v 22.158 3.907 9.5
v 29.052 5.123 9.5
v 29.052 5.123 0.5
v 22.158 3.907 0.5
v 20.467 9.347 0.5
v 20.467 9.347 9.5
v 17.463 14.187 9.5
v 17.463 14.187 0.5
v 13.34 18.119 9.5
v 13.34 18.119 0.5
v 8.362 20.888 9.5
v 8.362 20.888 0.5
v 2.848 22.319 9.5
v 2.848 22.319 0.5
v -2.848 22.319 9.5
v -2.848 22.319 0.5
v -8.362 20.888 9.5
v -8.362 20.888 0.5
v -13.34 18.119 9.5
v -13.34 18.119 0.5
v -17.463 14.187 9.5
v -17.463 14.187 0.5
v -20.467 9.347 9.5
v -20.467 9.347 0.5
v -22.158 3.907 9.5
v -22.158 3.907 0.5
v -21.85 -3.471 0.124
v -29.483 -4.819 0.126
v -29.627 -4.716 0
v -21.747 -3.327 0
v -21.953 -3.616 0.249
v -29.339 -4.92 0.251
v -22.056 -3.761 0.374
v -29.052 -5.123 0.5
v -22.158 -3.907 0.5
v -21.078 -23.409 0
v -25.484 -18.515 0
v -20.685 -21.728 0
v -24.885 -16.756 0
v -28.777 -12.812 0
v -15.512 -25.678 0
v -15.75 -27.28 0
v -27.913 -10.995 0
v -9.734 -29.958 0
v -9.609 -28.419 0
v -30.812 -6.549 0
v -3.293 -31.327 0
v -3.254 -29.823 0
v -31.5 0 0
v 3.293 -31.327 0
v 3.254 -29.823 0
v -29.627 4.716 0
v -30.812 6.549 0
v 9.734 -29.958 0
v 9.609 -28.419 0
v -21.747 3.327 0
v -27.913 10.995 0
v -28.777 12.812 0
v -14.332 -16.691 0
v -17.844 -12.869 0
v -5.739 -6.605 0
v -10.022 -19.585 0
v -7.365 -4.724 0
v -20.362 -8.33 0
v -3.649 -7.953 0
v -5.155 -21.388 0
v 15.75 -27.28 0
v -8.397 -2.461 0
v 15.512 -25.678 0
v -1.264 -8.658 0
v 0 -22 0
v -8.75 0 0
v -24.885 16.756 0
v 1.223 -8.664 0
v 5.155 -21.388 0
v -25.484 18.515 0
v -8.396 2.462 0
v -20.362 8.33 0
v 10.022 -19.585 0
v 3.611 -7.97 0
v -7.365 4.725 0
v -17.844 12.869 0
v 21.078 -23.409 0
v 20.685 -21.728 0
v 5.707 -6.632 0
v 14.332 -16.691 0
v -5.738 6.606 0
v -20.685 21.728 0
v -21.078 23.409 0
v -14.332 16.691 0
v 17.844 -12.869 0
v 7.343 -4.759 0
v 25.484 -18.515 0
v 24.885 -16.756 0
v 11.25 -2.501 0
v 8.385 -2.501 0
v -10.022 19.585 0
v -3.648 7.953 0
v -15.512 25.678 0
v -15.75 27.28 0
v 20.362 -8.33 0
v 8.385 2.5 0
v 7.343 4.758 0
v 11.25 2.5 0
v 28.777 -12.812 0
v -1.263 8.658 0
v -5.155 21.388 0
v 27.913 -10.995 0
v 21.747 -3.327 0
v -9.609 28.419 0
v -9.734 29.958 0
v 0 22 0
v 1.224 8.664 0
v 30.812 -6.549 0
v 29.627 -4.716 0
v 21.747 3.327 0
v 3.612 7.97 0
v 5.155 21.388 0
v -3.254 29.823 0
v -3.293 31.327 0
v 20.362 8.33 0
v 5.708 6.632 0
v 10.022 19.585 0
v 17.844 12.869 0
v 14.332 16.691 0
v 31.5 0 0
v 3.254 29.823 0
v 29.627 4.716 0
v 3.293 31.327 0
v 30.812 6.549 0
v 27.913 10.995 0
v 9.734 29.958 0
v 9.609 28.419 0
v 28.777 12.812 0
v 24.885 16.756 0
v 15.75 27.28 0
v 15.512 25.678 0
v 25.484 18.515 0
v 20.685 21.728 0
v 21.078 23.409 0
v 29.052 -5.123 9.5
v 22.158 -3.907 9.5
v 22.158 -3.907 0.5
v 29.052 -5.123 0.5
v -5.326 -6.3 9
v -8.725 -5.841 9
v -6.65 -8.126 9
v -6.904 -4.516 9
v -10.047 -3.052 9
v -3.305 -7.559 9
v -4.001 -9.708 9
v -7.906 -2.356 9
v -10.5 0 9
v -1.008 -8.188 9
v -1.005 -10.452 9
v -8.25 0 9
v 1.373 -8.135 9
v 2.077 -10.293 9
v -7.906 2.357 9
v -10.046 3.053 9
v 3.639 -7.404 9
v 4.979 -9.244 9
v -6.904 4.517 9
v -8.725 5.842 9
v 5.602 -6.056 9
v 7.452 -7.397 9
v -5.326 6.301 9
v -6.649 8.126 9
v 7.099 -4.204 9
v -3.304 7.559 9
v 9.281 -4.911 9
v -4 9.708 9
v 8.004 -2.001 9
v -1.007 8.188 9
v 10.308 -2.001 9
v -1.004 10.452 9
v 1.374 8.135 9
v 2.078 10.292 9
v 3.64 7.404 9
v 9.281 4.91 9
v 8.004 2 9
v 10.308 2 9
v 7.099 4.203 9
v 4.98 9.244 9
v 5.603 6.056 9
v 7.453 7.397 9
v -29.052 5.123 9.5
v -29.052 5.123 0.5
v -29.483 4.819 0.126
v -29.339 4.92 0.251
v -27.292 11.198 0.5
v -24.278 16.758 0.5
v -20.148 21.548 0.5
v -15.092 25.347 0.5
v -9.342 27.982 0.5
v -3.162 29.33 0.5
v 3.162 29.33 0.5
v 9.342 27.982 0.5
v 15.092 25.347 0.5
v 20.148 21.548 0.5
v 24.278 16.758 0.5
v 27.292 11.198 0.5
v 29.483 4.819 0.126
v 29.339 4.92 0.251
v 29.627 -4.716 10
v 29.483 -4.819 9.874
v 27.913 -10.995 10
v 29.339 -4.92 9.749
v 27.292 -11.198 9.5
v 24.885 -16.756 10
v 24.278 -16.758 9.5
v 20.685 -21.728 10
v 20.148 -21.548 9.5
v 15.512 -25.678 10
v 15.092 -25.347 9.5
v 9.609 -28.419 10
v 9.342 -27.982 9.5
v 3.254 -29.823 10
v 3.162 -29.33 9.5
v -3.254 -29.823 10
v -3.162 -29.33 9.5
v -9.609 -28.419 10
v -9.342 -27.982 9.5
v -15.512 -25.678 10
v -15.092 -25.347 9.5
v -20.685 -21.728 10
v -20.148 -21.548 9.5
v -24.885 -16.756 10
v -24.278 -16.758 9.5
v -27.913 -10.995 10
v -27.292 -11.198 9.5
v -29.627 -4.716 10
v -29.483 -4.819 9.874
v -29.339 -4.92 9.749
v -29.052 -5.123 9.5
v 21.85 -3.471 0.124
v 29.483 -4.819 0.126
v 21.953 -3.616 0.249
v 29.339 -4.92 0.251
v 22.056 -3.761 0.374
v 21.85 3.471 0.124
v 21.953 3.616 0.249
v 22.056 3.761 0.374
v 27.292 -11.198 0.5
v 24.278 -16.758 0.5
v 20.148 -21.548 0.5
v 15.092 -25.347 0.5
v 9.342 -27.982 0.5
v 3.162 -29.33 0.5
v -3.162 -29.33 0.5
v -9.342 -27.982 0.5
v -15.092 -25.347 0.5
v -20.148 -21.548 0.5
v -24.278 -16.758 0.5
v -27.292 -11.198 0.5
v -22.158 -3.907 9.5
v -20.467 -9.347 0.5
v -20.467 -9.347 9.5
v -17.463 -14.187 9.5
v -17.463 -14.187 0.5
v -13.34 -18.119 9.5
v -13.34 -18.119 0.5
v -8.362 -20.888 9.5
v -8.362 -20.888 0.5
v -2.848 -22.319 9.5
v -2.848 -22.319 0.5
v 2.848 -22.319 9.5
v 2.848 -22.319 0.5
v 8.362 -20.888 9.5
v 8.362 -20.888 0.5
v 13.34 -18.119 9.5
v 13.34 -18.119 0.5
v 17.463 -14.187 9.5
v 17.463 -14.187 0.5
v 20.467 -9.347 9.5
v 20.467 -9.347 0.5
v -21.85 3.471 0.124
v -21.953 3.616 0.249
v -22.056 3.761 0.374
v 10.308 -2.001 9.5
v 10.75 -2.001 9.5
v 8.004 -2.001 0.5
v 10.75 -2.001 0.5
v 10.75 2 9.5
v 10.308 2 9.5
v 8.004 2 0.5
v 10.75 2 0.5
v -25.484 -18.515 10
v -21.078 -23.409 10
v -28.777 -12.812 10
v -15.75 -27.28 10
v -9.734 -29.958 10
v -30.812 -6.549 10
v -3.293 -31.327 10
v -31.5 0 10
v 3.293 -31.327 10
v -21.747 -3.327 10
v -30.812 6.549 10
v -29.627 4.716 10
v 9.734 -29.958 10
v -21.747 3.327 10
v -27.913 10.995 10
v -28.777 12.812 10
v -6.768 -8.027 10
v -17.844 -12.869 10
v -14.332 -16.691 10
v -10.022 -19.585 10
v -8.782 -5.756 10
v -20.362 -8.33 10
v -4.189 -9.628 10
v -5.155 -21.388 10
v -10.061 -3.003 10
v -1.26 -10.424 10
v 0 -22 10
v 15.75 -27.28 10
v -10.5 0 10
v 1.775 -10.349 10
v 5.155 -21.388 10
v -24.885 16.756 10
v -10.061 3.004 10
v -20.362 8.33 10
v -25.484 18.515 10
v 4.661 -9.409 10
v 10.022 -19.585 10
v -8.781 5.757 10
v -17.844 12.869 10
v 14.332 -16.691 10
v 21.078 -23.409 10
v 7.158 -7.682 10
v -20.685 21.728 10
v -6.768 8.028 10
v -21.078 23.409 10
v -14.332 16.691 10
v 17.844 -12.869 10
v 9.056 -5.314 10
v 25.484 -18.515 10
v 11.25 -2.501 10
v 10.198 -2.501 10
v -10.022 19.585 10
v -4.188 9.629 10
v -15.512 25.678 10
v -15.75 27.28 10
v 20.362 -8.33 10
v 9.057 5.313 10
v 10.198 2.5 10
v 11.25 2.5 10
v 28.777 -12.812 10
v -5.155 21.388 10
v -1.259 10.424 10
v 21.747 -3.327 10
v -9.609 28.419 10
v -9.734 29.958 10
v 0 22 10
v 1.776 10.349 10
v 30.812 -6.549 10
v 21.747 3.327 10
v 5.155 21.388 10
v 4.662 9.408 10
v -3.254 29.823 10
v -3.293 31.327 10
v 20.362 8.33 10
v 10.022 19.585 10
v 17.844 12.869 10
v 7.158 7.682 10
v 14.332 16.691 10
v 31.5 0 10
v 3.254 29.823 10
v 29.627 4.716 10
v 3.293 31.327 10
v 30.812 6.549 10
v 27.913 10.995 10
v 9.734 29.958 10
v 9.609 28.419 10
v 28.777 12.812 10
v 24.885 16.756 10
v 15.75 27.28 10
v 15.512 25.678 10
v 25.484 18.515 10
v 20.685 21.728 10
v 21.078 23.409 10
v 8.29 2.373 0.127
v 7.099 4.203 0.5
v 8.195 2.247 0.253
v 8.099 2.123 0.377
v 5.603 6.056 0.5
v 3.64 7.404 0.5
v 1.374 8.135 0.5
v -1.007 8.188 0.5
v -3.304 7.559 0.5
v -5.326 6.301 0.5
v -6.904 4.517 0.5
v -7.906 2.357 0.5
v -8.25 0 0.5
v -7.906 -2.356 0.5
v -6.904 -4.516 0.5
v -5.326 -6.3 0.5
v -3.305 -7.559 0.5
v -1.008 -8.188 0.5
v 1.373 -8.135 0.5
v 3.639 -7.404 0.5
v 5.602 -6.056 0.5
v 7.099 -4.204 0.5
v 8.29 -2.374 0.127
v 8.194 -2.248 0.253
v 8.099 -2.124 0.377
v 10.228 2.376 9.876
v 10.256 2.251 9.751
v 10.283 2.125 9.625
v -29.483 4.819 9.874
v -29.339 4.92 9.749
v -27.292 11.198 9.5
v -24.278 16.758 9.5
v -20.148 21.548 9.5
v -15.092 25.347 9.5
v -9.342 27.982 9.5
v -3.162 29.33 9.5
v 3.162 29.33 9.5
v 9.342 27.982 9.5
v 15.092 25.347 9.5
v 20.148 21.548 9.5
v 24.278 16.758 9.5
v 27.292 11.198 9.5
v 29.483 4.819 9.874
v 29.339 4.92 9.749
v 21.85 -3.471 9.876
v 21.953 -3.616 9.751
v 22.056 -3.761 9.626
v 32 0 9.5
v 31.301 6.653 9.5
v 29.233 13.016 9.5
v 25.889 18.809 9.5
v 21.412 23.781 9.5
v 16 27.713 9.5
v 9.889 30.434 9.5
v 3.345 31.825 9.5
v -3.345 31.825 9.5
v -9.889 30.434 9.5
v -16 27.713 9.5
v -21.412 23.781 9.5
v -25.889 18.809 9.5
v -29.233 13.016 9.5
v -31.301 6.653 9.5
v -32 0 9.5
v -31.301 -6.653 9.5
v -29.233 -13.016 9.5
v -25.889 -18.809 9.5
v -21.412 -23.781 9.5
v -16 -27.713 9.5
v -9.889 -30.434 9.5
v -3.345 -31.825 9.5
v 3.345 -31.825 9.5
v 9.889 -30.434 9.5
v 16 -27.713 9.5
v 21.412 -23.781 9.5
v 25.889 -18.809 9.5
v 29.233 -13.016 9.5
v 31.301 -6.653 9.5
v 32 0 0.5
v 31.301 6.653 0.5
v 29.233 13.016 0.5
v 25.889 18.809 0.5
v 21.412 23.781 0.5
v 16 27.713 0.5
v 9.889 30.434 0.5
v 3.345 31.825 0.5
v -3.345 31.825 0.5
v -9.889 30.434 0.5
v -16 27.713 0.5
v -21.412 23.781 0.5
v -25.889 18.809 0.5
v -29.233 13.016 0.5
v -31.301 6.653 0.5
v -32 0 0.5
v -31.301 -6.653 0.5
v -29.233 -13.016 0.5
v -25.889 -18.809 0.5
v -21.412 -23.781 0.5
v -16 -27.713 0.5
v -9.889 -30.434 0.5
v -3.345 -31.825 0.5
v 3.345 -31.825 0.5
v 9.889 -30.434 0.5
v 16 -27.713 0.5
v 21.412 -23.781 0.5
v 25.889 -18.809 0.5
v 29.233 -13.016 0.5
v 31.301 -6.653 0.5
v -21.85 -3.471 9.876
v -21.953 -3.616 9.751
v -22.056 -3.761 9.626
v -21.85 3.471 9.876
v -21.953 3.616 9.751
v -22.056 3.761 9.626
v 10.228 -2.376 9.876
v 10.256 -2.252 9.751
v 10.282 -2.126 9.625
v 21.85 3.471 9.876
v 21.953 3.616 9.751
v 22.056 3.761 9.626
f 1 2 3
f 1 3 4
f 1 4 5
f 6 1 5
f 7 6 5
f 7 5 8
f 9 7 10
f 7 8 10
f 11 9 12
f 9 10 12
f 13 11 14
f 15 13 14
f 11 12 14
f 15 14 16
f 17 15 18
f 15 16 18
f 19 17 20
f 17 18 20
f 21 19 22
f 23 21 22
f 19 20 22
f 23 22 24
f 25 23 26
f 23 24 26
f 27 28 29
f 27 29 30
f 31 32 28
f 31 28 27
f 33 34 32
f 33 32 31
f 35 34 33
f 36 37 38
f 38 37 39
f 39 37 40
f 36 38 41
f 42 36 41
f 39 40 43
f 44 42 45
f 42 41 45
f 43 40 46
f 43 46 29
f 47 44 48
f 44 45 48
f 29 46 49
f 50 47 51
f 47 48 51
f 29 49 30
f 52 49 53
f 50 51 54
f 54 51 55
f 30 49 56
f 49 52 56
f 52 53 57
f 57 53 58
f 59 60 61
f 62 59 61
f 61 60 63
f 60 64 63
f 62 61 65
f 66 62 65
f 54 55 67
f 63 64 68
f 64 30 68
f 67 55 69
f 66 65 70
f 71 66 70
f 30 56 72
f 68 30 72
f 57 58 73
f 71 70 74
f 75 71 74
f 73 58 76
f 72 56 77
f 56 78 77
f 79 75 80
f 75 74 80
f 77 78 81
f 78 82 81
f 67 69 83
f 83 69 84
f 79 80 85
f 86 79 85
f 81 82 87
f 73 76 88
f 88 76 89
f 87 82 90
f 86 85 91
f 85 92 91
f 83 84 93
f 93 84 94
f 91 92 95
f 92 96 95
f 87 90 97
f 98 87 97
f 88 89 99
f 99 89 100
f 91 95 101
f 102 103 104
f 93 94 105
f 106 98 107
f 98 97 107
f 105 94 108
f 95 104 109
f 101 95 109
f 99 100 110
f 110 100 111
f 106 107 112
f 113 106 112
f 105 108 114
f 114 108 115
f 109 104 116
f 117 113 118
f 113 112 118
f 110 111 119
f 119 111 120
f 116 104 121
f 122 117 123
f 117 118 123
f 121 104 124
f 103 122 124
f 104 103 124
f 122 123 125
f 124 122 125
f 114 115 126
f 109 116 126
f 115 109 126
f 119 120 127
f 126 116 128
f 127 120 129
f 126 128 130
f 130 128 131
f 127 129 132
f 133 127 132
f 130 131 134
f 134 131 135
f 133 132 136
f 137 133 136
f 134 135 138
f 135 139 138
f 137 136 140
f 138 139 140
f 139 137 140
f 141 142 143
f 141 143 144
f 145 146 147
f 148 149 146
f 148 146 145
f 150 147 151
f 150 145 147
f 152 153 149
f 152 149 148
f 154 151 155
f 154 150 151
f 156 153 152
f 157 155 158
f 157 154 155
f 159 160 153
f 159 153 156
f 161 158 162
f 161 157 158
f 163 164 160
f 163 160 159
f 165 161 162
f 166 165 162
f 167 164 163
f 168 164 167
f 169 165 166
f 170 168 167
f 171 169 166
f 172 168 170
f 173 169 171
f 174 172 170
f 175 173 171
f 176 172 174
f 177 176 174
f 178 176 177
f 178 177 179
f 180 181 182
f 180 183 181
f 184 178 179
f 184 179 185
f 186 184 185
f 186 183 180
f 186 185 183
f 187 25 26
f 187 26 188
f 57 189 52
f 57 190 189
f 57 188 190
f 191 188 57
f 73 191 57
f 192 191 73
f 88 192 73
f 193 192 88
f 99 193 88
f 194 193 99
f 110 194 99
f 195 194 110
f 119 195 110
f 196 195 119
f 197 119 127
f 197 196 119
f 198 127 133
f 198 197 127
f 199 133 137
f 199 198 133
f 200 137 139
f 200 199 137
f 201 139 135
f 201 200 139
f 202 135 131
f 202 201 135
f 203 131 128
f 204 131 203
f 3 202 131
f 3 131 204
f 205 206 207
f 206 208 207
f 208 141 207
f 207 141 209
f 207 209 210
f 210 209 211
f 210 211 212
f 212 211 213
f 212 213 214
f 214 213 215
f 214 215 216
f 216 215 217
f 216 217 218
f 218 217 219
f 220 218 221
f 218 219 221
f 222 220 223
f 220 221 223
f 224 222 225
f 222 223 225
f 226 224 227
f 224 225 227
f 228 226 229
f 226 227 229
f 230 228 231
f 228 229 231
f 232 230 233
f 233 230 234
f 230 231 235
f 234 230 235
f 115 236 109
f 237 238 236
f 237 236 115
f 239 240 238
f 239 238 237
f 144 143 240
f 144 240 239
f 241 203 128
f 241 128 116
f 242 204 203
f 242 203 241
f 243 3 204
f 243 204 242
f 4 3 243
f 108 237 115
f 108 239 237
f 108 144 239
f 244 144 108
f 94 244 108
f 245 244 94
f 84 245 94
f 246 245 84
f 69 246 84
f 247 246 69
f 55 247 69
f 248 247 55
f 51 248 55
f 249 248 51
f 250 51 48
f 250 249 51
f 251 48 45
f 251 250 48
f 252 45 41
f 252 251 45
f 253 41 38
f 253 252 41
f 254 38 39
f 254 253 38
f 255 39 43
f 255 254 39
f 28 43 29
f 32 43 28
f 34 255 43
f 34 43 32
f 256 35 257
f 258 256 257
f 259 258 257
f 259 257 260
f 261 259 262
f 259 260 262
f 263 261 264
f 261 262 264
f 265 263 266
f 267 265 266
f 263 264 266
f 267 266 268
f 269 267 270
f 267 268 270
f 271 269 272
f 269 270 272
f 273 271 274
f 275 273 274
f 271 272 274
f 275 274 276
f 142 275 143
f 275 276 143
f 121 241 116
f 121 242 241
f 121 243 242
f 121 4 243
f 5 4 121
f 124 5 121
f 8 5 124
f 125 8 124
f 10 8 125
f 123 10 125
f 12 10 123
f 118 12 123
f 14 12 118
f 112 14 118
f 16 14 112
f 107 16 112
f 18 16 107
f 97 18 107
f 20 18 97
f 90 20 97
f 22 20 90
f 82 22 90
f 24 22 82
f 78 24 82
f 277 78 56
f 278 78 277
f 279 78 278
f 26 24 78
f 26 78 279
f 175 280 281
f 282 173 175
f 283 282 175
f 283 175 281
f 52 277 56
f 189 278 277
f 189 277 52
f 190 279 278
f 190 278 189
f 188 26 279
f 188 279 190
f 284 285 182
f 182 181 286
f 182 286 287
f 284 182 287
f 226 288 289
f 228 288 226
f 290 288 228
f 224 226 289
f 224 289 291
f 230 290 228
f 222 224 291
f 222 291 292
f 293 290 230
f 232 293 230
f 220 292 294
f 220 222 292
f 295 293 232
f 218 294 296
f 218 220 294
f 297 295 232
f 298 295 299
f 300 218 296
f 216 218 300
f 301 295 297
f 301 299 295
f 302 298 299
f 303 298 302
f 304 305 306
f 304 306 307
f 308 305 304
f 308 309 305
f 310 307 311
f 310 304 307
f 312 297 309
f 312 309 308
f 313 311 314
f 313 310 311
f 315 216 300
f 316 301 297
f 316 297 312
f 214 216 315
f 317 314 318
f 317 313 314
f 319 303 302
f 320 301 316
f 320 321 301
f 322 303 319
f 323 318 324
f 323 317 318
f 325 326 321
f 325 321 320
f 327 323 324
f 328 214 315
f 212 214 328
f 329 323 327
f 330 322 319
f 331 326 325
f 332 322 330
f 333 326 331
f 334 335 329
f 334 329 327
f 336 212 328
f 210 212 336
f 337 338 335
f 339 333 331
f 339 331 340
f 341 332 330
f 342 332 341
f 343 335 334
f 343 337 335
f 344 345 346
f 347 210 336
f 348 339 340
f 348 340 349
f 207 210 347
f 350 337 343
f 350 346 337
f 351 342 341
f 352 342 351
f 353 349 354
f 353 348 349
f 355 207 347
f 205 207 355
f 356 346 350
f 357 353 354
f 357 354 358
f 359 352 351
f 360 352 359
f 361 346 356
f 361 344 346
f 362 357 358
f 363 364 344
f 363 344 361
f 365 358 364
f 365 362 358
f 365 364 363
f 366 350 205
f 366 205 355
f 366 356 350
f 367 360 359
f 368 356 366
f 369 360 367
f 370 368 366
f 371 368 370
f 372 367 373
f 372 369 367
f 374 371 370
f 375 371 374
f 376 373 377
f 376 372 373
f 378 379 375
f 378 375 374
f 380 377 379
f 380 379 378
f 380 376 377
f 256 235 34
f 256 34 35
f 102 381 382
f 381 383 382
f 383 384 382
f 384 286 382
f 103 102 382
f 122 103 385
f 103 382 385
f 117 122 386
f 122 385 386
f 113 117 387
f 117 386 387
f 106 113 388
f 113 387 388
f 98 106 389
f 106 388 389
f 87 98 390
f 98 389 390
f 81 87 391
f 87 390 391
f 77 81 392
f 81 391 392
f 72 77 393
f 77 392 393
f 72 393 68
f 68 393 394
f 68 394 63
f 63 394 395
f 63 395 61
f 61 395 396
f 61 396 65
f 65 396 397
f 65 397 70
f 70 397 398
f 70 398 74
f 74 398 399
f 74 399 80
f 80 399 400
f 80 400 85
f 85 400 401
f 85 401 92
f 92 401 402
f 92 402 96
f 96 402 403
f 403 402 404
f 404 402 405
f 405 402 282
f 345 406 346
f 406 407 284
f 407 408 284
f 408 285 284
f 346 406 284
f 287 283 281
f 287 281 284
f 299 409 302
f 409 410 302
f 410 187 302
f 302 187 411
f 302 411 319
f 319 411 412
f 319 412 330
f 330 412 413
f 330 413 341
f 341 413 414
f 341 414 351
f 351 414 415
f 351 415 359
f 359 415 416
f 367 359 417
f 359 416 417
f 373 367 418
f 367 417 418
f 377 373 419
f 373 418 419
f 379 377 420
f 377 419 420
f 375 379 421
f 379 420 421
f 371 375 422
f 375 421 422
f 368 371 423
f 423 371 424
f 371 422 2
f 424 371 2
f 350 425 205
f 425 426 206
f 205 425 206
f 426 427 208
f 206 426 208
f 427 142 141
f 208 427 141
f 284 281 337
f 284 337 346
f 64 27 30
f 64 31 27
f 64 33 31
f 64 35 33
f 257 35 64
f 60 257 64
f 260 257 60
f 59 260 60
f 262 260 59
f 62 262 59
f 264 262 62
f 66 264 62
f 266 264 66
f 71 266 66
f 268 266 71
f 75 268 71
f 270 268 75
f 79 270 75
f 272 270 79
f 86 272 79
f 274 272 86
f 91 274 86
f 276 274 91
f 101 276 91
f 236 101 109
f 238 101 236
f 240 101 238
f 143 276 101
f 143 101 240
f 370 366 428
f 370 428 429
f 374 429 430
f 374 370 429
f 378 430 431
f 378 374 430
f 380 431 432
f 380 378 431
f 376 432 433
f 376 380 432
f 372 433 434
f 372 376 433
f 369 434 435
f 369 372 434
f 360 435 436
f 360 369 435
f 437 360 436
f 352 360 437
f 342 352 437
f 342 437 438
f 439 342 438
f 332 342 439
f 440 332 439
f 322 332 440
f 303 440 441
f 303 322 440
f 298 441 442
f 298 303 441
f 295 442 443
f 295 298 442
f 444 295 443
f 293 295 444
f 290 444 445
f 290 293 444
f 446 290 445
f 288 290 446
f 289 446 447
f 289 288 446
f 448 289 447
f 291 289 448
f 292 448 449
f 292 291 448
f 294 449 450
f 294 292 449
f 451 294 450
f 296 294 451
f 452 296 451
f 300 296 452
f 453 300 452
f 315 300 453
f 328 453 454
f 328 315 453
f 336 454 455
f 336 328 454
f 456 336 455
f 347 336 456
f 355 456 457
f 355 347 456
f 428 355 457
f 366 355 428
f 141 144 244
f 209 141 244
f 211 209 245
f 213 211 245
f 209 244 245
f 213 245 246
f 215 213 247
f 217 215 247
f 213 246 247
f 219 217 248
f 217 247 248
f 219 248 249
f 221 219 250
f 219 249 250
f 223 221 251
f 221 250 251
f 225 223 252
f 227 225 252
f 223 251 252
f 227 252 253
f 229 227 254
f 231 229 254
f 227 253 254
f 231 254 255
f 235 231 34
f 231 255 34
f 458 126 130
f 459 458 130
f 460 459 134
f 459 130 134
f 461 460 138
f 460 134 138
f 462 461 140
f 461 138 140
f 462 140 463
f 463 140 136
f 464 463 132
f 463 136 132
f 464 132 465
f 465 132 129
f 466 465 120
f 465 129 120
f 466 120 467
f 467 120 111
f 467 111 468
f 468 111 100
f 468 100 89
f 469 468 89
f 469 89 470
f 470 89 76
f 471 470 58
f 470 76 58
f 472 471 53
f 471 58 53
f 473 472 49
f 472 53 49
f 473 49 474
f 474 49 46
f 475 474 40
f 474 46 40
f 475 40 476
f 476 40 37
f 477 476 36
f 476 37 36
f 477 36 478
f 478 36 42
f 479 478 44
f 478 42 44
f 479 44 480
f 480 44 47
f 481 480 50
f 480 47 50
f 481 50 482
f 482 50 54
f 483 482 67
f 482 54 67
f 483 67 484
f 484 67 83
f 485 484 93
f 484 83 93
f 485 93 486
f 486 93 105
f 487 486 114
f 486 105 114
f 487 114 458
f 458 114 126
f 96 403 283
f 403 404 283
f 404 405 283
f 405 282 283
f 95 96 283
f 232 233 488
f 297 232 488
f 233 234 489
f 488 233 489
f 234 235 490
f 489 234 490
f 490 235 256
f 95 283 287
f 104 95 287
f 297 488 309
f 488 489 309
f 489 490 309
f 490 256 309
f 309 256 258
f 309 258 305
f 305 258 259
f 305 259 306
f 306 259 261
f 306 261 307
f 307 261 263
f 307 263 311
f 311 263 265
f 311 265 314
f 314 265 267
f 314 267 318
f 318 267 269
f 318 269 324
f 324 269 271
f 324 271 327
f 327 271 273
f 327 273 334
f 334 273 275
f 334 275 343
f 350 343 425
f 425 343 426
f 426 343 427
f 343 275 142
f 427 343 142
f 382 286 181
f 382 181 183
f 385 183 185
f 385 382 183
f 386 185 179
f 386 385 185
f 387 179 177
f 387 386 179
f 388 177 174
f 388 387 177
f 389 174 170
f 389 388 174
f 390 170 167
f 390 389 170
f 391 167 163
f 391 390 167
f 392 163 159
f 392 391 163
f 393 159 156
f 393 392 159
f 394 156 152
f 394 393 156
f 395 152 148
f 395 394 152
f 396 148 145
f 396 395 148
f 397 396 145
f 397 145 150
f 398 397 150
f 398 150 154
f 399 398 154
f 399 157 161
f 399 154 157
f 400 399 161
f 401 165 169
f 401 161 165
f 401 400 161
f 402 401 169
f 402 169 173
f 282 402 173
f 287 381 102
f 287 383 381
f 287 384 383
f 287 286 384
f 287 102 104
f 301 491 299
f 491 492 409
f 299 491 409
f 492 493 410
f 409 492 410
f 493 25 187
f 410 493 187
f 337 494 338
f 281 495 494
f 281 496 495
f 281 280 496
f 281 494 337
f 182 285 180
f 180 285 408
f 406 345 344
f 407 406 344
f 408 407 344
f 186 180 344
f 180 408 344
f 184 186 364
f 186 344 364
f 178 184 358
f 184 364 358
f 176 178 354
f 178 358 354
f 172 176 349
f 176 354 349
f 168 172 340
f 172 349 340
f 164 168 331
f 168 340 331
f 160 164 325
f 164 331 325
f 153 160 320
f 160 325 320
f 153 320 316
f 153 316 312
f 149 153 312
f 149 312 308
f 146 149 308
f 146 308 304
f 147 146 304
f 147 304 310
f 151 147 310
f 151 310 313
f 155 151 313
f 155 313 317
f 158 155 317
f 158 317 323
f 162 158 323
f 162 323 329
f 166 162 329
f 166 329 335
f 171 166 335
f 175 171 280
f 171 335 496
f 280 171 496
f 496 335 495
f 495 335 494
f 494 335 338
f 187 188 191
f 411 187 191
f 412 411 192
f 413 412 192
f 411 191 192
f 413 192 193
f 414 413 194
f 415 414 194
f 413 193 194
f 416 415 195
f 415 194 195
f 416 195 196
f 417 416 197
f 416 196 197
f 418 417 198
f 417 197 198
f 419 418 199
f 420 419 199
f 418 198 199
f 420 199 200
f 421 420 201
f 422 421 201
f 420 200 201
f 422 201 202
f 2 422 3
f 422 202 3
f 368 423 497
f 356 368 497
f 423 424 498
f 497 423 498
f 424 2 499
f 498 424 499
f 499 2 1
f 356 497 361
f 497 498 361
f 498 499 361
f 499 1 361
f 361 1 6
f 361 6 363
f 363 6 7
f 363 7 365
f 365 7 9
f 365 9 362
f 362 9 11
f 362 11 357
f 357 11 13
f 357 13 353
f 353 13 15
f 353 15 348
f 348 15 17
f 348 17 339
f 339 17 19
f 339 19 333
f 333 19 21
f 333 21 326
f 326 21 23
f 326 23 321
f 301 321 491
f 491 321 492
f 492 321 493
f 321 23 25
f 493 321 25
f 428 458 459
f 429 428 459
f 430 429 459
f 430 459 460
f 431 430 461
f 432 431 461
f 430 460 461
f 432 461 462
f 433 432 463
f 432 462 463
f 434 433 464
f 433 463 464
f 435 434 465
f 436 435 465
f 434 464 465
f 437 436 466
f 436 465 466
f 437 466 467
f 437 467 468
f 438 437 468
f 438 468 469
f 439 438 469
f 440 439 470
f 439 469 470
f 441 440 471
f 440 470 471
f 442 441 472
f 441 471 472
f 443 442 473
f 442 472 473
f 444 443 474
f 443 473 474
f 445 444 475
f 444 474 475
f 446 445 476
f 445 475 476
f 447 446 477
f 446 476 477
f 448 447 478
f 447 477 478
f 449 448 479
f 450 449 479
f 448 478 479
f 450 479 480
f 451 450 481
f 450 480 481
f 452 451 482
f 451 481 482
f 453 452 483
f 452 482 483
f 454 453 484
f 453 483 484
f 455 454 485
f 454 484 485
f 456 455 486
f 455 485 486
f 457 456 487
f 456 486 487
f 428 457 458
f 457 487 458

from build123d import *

# Parameters (mm, degrees)
SKETCH_1_R          = 32
EXTRUDE_1_DEPTH     = 10
SKETCH_2_R          = 8.25
CUT_EXTRUDE_1_DEPTH = 10
SKETCH_4_W          = 2.746324374
SKETCH_4_H          = 4.000918907
CUT_EXTRUDE_3_DEPTH = 10
CUT_EXTRUDE_4_DEPTH = 10
CUT_EXTRUDE_5_DEPTH = 10
CHAMFER_1_SIZE      = 0.5
CHAMFER_2_SIZE      = 0.5
SKETCH_7_R          = 10.5
CUT_EXTRUDE_6_DEPTH = 1


with BuildPart() as part:
    # 草图1 → 凸台-拉伸1 (new body)
    with BuildSketch(Plane.XY):
        Circle(SKETCH_1_R)
    extrude(amount=EXTRUDE_1_DEPTH)

    # 草图2 → 切除-拉伸1 (cut)
    with BuildSketch(Plane.XY):
        Circle(SKETCH_2_R)
    extrude(amount=CUT_EXTRUDE_1_DEPTH, mode=Mode.SUBTRACT)

    # 草图4 → 切除-拉伸3 (cut)
    with BuildSketch(Plane.XY):
        with Locations((9.376837813, -0.000459453)):
            Rectangle(SKETCH_4_W, SKETCH_4_H)
    extrude(amount=CUT_EXTRUDE_3_DEPTH, mode=Mode.SUBTRACT)

    # 草图5 → 切除-拉伸4 (cut)
    with BuildSketch(Plane.XY):
        with BuildLine():
            Line((-22.1582, 3.9071), (-29.0518, 5.1226))
            ThreePointArc((-29.0518, 5.1226), (0, 29.5), (29.0518, 5.1226))
            Line((29.0518, 5.1226), (22.1582, 3.9071))
            ThreePointArc((22.1582, 3.9071), (0, 22.5), (-22.1582, 3.9071))
        make_face()
    extrude(amount=CUT_EXTRUDE_4_DEPTH, mode=Mode.SUBTRACT)

    # 草图6 → 切除-拉伸5 (cut)
    with BuildSketch(Plane.XY):
        with BuildLine():
            Line((22.1582, -3.9071), (29.0518, -5.1226))
            ThreePointArc((29.0518, -5.1226), (0, -29.5), (-29.0518, -5.1226))
            Line((-29.0518, -5.1226), (-22.1582, -3.9071))
            ThreePointArc((-22.1582, -3.9071), (0, -22.5), (22.1582, -3.9071))
        make_face()
    extrude(amount=CUT_EXTRUDE_5_DEPTH, mode=Mode.SUBTRACT)

    # 倒角1
    chamfer_1_edges = [part.edges().sort_by_distance(p)[0] for p in [
        (9.376952648, 2, 10),
        (9.376837813, -2.000918907, 10),
        (10.75, -0.000459453, 10),
        (0, 22.5, 10),
        (25.605, 4.51485, 10),
        (0, 29.5, 10),
        (-25.605, 4.51485, 10),
        (0, -22.5, 10),
        (-32, 0, 10),
        (-25.605, -4.51485, 10),
        (0, -29.5, 10),
        (25.605, -4.51485, 10),
        (-8.249999986, 0.000473587, 10),
    ]]
    chamfer(chamfer_1_edges, length=CHAMFER_1_SIZE)

    # 倒角2
    chamfer_2_edges = [part.edges().sort_by_distance(p)[0] for p in [
        (9.376837813, -2.000918907, 0),
        (10.75, -0.000459453, 0),
        (9.376952648, 2, 0),
        (-32, 0, 0),
        (0, 22.5, 0),
        (25.605, 4.51485, 0),
        (0, 29.5, 0),
        (-25.605, 4.51485, 0),
        (0, -22.5, 0),
        (-25.605, -4.51485, 0),
        (0, -29.5, 0),
        (25.605, -4.51485, 0),
        (-8.249999986, 0.000473587, 0),
    ]]
    chamfer(chamfer_2_edges, length=CHAMFER_2_SIZE)

    # 草图7 → 切除-拉伸6 (cut)
    with BuildSketch(Plane.XY.offset(10)):
        Circle(SKETCH_7_R)
    extrude(amount=-CUT_EXTRUDE_6_DEPTH, mode=Mode.SUBTRACT)


solid = part.part
